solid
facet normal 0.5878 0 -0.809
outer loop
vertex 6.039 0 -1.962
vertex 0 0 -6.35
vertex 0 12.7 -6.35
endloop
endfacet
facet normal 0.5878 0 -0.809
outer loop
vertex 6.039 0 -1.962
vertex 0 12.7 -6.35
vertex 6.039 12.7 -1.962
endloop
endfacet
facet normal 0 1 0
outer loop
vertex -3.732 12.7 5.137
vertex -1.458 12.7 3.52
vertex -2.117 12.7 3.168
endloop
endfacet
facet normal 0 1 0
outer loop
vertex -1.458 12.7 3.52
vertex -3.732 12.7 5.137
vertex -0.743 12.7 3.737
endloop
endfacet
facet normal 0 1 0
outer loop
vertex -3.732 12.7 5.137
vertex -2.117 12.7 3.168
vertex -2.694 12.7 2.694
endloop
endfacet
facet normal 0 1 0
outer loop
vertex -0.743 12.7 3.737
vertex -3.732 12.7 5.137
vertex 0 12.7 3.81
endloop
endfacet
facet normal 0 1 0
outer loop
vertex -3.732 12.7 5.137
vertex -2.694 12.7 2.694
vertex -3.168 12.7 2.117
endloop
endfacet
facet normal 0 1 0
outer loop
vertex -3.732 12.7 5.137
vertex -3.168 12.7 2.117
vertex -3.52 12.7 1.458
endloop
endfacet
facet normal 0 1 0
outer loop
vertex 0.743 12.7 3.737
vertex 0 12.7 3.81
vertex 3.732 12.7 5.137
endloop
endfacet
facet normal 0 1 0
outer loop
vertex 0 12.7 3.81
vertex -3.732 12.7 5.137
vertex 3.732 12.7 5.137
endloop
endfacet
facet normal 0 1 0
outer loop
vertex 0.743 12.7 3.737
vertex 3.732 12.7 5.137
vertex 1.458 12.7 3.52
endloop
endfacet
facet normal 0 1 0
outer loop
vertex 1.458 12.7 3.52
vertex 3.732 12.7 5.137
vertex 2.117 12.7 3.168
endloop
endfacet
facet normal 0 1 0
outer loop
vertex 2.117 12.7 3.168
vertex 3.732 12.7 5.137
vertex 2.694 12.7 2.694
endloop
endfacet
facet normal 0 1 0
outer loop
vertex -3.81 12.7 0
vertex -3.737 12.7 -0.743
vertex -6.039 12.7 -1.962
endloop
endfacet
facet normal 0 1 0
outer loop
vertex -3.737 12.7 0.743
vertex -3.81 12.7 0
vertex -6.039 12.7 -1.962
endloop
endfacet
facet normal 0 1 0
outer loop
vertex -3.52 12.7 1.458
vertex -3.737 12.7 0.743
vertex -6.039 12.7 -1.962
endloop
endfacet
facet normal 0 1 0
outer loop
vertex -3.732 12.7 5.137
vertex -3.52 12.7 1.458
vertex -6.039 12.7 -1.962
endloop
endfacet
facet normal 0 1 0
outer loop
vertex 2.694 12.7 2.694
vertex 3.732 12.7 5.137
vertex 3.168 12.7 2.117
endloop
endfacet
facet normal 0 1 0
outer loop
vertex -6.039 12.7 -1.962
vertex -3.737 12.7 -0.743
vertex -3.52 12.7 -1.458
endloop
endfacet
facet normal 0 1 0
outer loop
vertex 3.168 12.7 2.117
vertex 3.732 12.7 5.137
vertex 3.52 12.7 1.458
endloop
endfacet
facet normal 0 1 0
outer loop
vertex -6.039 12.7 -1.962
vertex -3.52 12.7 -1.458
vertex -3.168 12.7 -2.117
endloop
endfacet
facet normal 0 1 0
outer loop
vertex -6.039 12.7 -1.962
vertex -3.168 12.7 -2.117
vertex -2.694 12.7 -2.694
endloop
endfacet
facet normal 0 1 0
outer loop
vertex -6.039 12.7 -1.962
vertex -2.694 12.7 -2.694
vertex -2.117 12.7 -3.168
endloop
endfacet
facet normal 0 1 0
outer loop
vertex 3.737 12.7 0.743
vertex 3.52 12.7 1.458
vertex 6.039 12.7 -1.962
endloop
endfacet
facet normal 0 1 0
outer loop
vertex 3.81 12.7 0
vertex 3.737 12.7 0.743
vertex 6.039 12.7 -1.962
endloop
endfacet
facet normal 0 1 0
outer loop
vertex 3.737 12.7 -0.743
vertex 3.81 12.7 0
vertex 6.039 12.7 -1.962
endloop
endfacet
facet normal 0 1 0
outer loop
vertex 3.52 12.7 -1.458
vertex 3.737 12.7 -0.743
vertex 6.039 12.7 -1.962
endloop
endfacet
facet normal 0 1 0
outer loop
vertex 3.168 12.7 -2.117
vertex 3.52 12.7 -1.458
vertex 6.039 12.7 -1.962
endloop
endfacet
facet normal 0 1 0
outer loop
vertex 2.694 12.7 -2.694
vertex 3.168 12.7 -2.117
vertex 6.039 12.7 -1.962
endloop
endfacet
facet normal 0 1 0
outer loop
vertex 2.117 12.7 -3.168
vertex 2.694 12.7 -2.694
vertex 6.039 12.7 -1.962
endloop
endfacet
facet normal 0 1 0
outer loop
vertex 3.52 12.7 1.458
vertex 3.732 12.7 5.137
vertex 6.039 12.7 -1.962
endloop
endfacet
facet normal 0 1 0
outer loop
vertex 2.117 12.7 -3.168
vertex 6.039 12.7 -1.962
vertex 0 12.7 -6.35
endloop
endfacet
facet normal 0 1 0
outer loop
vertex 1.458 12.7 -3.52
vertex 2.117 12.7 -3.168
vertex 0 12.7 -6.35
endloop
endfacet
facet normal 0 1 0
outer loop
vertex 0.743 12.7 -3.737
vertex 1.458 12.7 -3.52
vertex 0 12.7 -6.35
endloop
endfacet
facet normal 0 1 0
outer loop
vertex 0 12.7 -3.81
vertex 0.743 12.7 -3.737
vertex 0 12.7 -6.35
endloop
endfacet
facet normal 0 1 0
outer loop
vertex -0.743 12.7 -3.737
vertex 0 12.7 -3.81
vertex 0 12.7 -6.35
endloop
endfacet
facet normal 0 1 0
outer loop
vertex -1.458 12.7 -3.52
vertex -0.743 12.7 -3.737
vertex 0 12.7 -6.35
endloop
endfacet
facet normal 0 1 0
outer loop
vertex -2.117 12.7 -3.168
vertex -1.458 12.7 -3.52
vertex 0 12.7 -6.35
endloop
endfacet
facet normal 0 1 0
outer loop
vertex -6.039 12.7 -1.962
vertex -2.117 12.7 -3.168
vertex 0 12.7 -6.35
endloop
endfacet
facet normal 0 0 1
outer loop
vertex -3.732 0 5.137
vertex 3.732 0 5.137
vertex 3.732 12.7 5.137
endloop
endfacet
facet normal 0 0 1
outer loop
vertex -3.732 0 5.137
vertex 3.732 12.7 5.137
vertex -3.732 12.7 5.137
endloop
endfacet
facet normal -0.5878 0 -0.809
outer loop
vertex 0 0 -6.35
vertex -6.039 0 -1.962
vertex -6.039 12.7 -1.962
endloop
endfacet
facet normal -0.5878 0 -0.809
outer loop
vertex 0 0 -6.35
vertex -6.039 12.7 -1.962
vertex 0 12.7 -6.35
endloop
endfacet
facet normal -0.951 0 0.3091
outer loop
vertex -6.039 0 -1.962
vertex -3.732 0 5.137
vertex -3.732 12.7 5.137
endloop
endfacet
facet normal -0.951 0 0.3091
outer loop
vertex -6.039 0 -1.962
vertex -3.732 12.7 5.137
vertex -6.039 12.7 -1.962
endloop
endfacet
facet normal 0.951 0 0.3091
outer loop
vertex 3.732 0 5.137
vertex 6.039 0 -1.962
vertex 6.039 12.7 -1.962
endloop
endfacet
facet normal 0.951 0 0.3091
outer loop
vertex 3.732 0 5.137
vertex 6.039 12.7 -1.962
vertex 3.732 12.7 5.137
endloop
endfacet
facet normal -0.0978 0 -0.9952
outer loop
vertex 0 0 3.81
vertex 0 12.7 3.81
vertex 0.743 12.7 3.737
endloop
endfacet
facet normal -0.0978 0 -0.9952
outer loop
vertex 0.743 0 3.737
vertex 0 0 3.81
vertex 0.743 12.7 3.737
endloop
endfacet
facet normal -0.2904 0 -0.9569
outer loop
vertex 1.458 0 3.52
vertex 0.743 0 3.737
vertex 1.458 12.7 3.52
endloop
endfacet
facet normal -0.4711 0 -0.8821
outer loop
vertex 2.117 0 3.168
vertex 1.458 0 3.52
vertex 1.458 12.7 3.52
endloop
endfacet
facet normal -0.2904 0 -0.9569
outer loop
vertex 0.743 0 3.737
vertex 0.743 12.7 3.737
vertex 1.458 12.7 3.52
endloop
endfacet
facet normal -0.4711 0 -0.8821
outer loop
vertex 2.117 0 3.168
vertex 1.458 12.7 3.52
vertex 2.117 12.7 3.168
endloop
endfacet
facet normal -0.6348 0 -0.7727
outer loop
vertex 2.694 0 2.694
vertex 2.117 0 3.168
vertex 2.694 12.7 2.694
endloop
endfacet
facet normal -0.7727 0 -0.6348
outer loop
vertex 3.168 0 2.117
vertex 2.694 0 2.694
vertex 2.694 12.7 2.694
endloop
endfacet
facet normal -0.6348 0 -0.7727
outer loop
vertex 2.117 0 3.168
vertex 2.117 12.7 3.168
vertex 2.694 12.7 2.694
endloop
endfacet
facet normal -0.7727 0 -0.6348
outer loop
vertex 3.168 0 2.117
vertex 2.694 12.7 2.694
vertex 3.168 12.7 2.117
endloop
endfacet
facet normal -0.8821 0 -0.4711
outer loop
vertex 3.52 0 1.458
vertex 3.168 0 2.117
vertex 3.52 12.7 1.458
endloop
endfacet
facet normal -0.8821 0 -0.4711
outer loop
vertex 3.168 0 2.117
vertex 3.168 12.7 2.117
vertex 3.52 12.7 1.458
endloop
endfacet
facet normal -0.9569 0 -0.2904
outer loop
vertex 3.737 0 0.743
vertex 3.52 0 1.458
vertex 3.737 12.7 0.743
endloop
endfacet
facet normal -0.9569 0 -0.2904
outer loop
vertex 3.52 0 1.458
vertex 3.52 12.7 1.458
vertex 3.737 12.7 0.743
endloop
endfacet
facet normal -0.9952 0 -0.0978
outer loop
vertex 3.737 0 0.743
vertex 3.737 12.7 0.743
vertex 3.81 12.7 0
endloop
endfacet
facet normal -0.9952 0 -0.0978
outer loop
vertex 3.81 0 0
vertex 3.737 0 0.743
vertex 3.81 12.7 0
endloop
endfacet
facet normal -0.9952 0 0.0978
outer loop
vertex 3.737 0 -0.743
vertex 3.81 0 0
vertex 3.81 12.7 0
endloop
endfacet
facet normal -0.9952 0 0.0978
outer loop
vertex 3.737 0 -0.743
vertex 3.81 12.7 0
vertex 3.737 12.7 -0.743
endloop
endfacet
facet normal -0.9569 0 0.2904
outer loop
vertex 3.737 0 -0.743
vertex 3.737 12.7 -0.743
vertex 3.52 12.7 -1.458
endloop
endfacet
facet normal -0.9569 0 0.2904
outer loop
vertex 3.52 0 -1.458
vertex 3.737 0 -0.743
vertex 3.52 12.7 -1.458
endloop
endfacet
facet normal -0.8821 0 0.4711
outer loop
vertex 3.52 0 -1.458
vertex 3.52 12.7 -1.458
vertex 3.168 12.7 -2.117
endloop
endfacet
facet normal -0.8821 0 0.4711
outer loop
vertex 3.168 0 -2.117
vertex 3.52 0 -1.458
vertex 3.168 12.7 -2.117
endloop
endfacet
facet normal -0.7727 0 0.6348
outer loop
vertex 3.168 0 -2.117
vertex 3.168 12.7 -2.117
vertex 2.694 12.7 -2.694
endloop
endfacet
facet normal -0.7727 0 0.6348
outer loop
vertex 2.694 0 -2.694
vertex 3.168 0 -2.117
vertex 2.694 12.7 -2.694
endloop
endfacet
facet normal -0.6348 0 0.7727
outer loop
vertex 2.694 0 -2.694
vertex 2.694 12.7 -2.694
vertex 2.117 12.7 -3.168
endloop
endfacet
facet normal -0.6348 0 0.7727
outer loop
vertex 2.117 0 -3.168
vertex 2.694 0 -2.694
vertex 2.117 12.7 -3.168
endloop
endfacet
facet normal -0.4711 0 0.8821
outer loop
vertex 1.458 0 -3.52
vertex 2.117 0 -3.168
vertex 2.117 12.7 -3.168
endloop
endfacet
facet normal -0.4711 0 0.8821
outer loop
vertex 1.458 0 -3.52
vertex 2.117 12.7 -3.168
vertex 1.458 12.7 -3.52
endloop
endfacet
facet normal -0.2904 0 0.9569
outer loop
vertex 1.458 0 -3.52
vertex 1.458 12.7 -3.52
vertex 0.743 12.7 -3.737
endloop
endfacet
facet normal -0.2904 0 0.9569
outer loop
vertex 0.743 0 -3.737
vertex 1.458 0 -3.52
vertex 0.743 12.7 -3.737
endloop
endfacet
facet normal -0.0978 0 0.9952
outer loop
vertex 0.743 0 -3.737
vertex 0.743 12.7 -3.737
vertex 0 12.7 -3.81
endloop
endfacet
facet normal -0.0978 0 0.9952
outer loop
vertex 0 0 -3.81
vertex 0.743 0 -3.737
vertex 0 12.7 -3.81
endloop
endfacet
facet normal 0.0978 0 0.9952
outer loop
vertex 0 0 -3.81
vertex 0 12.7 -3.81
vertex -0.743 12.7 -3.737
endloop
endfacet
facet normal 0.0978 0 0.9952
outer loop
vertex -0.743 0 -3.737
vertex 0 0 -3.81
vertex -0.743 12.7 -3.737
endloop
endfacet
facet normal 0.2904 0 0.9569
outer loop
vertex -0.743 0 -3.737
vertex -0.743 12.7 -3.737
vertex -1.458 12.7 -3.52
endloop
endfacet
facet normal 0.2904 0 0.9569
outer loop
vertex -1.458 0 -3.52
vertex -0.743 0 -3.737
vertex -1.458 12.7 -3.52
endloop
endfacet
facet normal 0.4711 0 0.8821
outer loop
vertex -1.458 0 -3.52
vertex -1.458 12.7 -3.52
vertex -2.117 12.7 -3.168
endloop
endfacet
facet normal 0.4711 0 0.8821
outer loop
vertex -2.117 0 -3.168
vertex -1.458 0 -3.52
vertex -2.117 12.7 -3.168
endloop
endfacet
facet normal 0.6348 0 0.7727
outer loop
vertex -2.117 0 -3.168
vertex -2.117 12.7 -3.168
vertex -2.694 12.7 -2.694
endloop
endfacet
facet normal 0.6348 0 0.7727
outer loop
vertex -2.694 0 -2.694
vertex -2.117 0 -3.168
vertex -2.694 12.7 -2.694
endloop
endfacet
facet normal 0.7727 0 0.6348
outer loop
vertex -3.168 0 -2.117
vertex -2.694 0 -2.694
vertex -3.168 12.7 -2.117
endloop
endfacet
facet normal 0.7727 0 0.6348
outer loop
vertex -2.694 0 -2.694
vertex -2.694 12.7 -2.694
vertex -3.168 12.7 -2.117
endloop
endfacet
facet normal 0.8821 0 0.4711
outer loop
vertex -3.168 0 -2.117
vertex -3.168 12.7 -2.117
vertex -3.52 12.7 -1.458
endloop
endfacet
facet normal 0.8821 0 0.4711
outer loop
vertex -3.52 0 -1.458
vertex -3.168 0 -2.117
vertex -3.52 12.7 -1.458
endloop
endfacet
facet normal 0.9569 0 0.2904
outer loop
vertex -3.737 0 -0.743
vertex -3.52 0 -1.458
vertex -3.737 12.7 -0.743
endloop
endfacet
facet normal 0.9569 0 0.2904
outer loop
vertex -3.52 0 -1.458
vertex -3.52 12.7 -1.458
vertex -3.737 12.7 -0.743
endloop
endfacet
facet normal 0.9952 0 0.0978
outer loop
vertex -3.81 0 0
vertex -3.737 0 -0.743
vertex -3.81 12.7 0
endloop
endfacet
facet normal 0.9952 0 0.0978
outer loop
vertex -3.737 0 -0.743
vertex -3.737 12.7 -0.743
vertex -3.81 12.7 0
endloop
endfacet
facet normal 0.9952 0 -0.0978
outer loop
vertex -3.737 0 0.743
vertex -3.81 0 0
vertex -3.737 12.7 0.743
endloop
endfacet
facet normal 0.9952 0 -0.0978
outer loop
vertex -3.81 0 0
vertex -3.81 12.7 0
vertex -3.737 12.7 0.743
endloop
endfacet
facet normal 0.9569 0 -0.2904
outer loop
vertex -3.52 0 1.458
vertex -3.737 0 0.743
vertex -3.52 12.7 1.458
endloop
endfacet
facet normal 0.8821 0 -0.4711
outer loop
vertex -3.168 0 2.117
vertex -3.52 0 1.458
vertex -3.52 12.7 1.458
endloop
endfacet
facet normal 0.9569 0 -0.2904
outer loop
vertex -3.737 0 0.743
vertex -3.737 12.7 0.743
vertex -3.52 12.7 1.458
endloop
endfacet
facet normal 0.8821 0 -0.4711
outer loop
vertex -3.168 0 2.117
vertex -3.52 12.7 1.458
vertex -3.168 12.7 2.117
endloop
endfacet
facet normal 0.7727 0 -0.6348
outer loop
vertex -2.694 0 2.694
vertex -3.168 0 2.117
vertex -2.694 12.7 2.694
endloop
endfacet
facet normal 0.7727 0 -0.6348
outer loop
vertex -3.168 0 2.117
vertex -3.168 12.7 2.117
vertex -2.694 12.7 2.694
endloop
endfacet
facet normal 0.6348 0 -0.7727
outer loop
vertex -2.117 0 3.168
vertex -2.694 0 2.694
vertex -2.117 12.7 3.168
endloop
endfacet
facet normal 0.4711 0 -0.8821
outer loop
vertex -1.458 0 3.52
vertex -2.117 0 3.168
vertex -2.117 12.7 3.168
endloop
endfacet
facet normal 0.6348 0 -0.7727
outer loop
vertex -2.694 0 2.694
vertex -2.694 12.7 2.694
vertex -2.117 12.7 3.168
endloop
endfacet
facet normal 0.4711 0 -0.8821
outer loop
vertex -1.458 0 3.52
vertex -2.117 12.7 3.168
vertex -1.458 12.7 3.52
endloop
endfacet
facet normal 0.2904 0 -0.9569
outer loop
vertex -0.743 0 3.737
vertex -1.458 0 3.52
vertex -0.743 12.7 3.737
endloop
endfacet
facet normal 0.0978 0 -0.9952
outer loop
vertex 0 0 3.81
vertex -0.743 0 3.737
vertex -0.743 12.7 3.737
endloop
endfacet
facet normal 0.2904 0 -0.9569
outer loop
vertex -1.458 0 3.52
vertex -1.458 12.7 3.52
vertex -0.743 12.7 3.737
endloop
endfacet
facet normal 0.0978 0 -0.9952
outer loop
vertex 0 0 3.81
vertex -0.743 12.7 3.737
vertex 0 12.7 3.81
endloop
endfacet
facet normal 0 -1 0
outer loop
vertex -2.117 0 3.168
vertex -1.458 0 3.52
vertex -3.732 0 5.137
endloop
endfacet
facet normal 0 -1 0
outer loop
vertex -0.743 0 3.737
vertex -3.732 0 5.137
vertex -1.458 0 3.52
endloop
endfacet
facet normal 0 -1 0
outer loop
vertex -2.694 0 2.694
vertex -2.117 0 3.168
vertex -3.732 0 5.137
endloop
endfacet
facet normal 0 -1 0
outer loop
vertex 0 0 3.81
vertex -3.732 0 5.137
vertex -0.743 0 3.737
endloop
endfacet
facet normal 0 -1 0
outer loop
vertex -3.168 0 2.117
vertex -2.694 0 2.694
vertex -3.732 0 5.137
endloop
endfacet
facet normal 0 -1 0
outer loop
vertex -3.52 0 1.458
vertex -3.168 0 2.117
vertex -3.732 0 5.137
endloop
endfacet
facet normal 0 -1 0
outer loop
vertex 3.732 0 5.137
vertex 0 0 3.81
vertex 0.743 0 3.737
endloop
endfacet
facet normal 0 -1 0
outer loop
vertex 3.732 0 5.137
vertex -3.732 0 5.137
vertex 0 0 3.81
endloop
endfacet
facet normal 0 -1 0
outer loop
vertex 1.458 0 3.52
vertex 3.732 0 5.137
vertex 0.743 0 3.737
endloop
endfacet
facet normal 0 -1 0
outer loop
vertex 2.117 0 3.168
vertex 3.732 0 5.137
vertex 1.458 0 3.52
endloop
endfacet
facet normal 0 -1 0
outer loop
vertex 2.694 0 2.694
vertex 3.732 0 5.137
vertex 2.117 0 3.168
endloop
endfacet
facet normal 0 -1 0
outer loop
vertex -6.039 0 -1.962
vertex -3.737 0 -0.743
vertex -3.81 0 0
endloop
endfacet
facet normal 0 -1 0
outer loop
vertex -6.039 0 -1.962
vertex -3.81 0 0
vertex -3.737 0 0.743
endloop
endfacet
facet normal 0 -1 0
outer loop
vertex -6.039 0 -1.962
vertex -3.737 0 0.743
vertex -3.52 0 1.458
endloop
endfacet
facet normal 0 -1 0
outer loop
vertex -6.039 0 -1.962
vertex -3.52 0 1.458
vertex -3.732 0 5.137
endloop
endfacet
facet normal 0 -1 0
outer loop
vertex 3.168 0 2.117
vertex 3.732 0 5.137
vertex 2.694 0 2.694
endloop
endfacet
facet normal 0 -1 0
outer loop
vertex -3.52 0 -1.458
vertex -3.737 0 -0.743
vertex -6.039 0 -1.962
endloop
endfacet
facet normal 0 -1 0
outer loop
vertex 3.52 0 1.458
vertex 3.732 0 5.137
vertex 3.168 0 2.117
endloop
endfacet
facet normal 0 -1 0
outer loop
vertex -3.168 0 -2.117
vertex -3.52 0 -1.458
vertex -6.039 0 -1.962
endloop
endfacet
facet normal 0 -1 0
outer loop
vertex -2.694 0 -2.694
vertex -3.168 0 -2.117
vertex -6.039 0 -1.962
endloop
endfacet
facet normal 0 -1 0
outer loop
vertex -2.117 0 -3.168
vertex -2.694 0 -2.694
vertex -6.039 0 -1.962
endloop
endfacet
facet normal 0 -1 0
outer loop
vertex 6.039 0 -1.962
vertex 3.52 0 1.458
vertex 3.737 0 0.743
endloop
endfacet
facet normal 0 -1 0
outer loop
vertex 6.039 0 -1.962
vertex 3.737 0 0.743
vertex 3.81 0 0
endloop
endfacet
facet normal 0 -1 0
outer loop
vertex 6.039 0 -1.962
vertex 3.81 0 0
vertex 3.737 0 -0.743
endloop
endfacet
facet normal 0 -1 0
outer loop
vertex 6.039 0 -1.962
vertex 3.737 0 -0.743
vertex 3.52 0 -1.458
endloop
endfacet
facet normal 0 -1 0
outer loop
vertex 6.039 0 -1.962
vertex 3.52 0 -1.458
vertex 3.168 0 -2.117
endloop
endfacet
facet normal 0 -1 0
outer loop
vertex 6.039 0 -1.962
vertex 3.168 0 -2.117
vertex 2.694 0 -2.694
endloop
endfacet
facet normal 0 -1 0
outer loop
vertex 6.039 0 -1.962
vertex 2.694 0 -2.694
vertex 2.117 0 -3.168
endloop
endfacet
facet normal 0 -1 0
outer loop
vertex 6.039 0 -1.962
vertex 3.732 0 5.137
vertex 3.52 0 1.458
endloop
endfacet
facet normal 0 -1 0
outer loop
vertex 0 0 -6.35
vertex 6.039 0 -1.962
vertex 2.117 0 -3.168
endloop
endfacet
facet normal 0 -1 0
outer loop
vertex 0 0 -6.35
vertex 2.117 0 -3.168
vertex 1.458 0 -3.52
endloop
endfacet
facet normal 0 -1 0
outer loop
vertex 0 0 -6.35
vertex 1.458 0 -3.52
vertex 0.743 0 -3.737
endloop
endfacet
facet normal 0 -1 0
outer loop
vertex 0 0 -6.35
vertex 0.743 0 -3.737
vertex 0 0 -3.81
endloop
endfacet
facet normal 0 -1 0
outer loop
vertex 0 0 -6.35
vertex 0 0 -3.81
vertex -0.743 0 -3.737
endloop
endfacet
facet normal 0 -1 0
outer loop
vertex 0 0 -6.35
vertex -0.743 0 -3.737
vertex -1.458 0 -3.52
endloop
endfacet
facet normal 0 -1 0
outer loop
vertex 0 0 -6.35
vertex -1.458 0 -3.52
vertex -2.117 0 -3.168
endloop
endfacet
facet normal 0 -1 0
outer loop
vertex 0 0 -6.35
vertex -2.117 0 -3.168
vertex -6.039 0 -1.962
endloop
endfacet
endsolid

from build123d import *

# Parameters (mm, degrees)
BOSS_EXTRUDE1_DEPTH = 12.7
CIRPATTERN1_COUNT   = 5
SKETCH3_R           = 3.81
CUT_EXTRUDE1_DEPTH  = 16.42998846


with BuildPart() as part:
    # Sketch1 → Boss-Extrude1 (new body)
    with BuildSketch(Plane(origin=(0, 0, 0), x_dir=(1, 0, 0), z_dir=(0, 1, 0))):
        Polygon((0, 6.35), (6.039208878, 1.962257914), (0, 0), align=None)
    boss_extrude1 = extrude(amount=BOSS_EXTRUDE1_DEPTH)

    # CirPattern1: Boss-Extrude1 ×5 about axis
    cirpattern1_axis = Axis((0, 0, 0), (0, 1, 0))
    for i in range(1, CIRPATTERN1_COUNT):
        add(boss_extrude1.rotate(cirpattern1_axis, i * 360 / CIRPATTERN1_COUNT))

    # Sketch3 → Cut-Extrude1 (cut, through all)
    with BuildSketch(Plane(origin=(0, 12.7, 0), x_dir=(1, 0, 0), z_dir=(0, 1, 0))):
        with Locations(Location((0, 0, 0), (0, 0, 270))):
            Circle(SKETCH3_R)
    extrude(amount=-CUT_EXTRUDE1_DEPTH, mode=Mode.SUBTRACT)


solid = part.part
